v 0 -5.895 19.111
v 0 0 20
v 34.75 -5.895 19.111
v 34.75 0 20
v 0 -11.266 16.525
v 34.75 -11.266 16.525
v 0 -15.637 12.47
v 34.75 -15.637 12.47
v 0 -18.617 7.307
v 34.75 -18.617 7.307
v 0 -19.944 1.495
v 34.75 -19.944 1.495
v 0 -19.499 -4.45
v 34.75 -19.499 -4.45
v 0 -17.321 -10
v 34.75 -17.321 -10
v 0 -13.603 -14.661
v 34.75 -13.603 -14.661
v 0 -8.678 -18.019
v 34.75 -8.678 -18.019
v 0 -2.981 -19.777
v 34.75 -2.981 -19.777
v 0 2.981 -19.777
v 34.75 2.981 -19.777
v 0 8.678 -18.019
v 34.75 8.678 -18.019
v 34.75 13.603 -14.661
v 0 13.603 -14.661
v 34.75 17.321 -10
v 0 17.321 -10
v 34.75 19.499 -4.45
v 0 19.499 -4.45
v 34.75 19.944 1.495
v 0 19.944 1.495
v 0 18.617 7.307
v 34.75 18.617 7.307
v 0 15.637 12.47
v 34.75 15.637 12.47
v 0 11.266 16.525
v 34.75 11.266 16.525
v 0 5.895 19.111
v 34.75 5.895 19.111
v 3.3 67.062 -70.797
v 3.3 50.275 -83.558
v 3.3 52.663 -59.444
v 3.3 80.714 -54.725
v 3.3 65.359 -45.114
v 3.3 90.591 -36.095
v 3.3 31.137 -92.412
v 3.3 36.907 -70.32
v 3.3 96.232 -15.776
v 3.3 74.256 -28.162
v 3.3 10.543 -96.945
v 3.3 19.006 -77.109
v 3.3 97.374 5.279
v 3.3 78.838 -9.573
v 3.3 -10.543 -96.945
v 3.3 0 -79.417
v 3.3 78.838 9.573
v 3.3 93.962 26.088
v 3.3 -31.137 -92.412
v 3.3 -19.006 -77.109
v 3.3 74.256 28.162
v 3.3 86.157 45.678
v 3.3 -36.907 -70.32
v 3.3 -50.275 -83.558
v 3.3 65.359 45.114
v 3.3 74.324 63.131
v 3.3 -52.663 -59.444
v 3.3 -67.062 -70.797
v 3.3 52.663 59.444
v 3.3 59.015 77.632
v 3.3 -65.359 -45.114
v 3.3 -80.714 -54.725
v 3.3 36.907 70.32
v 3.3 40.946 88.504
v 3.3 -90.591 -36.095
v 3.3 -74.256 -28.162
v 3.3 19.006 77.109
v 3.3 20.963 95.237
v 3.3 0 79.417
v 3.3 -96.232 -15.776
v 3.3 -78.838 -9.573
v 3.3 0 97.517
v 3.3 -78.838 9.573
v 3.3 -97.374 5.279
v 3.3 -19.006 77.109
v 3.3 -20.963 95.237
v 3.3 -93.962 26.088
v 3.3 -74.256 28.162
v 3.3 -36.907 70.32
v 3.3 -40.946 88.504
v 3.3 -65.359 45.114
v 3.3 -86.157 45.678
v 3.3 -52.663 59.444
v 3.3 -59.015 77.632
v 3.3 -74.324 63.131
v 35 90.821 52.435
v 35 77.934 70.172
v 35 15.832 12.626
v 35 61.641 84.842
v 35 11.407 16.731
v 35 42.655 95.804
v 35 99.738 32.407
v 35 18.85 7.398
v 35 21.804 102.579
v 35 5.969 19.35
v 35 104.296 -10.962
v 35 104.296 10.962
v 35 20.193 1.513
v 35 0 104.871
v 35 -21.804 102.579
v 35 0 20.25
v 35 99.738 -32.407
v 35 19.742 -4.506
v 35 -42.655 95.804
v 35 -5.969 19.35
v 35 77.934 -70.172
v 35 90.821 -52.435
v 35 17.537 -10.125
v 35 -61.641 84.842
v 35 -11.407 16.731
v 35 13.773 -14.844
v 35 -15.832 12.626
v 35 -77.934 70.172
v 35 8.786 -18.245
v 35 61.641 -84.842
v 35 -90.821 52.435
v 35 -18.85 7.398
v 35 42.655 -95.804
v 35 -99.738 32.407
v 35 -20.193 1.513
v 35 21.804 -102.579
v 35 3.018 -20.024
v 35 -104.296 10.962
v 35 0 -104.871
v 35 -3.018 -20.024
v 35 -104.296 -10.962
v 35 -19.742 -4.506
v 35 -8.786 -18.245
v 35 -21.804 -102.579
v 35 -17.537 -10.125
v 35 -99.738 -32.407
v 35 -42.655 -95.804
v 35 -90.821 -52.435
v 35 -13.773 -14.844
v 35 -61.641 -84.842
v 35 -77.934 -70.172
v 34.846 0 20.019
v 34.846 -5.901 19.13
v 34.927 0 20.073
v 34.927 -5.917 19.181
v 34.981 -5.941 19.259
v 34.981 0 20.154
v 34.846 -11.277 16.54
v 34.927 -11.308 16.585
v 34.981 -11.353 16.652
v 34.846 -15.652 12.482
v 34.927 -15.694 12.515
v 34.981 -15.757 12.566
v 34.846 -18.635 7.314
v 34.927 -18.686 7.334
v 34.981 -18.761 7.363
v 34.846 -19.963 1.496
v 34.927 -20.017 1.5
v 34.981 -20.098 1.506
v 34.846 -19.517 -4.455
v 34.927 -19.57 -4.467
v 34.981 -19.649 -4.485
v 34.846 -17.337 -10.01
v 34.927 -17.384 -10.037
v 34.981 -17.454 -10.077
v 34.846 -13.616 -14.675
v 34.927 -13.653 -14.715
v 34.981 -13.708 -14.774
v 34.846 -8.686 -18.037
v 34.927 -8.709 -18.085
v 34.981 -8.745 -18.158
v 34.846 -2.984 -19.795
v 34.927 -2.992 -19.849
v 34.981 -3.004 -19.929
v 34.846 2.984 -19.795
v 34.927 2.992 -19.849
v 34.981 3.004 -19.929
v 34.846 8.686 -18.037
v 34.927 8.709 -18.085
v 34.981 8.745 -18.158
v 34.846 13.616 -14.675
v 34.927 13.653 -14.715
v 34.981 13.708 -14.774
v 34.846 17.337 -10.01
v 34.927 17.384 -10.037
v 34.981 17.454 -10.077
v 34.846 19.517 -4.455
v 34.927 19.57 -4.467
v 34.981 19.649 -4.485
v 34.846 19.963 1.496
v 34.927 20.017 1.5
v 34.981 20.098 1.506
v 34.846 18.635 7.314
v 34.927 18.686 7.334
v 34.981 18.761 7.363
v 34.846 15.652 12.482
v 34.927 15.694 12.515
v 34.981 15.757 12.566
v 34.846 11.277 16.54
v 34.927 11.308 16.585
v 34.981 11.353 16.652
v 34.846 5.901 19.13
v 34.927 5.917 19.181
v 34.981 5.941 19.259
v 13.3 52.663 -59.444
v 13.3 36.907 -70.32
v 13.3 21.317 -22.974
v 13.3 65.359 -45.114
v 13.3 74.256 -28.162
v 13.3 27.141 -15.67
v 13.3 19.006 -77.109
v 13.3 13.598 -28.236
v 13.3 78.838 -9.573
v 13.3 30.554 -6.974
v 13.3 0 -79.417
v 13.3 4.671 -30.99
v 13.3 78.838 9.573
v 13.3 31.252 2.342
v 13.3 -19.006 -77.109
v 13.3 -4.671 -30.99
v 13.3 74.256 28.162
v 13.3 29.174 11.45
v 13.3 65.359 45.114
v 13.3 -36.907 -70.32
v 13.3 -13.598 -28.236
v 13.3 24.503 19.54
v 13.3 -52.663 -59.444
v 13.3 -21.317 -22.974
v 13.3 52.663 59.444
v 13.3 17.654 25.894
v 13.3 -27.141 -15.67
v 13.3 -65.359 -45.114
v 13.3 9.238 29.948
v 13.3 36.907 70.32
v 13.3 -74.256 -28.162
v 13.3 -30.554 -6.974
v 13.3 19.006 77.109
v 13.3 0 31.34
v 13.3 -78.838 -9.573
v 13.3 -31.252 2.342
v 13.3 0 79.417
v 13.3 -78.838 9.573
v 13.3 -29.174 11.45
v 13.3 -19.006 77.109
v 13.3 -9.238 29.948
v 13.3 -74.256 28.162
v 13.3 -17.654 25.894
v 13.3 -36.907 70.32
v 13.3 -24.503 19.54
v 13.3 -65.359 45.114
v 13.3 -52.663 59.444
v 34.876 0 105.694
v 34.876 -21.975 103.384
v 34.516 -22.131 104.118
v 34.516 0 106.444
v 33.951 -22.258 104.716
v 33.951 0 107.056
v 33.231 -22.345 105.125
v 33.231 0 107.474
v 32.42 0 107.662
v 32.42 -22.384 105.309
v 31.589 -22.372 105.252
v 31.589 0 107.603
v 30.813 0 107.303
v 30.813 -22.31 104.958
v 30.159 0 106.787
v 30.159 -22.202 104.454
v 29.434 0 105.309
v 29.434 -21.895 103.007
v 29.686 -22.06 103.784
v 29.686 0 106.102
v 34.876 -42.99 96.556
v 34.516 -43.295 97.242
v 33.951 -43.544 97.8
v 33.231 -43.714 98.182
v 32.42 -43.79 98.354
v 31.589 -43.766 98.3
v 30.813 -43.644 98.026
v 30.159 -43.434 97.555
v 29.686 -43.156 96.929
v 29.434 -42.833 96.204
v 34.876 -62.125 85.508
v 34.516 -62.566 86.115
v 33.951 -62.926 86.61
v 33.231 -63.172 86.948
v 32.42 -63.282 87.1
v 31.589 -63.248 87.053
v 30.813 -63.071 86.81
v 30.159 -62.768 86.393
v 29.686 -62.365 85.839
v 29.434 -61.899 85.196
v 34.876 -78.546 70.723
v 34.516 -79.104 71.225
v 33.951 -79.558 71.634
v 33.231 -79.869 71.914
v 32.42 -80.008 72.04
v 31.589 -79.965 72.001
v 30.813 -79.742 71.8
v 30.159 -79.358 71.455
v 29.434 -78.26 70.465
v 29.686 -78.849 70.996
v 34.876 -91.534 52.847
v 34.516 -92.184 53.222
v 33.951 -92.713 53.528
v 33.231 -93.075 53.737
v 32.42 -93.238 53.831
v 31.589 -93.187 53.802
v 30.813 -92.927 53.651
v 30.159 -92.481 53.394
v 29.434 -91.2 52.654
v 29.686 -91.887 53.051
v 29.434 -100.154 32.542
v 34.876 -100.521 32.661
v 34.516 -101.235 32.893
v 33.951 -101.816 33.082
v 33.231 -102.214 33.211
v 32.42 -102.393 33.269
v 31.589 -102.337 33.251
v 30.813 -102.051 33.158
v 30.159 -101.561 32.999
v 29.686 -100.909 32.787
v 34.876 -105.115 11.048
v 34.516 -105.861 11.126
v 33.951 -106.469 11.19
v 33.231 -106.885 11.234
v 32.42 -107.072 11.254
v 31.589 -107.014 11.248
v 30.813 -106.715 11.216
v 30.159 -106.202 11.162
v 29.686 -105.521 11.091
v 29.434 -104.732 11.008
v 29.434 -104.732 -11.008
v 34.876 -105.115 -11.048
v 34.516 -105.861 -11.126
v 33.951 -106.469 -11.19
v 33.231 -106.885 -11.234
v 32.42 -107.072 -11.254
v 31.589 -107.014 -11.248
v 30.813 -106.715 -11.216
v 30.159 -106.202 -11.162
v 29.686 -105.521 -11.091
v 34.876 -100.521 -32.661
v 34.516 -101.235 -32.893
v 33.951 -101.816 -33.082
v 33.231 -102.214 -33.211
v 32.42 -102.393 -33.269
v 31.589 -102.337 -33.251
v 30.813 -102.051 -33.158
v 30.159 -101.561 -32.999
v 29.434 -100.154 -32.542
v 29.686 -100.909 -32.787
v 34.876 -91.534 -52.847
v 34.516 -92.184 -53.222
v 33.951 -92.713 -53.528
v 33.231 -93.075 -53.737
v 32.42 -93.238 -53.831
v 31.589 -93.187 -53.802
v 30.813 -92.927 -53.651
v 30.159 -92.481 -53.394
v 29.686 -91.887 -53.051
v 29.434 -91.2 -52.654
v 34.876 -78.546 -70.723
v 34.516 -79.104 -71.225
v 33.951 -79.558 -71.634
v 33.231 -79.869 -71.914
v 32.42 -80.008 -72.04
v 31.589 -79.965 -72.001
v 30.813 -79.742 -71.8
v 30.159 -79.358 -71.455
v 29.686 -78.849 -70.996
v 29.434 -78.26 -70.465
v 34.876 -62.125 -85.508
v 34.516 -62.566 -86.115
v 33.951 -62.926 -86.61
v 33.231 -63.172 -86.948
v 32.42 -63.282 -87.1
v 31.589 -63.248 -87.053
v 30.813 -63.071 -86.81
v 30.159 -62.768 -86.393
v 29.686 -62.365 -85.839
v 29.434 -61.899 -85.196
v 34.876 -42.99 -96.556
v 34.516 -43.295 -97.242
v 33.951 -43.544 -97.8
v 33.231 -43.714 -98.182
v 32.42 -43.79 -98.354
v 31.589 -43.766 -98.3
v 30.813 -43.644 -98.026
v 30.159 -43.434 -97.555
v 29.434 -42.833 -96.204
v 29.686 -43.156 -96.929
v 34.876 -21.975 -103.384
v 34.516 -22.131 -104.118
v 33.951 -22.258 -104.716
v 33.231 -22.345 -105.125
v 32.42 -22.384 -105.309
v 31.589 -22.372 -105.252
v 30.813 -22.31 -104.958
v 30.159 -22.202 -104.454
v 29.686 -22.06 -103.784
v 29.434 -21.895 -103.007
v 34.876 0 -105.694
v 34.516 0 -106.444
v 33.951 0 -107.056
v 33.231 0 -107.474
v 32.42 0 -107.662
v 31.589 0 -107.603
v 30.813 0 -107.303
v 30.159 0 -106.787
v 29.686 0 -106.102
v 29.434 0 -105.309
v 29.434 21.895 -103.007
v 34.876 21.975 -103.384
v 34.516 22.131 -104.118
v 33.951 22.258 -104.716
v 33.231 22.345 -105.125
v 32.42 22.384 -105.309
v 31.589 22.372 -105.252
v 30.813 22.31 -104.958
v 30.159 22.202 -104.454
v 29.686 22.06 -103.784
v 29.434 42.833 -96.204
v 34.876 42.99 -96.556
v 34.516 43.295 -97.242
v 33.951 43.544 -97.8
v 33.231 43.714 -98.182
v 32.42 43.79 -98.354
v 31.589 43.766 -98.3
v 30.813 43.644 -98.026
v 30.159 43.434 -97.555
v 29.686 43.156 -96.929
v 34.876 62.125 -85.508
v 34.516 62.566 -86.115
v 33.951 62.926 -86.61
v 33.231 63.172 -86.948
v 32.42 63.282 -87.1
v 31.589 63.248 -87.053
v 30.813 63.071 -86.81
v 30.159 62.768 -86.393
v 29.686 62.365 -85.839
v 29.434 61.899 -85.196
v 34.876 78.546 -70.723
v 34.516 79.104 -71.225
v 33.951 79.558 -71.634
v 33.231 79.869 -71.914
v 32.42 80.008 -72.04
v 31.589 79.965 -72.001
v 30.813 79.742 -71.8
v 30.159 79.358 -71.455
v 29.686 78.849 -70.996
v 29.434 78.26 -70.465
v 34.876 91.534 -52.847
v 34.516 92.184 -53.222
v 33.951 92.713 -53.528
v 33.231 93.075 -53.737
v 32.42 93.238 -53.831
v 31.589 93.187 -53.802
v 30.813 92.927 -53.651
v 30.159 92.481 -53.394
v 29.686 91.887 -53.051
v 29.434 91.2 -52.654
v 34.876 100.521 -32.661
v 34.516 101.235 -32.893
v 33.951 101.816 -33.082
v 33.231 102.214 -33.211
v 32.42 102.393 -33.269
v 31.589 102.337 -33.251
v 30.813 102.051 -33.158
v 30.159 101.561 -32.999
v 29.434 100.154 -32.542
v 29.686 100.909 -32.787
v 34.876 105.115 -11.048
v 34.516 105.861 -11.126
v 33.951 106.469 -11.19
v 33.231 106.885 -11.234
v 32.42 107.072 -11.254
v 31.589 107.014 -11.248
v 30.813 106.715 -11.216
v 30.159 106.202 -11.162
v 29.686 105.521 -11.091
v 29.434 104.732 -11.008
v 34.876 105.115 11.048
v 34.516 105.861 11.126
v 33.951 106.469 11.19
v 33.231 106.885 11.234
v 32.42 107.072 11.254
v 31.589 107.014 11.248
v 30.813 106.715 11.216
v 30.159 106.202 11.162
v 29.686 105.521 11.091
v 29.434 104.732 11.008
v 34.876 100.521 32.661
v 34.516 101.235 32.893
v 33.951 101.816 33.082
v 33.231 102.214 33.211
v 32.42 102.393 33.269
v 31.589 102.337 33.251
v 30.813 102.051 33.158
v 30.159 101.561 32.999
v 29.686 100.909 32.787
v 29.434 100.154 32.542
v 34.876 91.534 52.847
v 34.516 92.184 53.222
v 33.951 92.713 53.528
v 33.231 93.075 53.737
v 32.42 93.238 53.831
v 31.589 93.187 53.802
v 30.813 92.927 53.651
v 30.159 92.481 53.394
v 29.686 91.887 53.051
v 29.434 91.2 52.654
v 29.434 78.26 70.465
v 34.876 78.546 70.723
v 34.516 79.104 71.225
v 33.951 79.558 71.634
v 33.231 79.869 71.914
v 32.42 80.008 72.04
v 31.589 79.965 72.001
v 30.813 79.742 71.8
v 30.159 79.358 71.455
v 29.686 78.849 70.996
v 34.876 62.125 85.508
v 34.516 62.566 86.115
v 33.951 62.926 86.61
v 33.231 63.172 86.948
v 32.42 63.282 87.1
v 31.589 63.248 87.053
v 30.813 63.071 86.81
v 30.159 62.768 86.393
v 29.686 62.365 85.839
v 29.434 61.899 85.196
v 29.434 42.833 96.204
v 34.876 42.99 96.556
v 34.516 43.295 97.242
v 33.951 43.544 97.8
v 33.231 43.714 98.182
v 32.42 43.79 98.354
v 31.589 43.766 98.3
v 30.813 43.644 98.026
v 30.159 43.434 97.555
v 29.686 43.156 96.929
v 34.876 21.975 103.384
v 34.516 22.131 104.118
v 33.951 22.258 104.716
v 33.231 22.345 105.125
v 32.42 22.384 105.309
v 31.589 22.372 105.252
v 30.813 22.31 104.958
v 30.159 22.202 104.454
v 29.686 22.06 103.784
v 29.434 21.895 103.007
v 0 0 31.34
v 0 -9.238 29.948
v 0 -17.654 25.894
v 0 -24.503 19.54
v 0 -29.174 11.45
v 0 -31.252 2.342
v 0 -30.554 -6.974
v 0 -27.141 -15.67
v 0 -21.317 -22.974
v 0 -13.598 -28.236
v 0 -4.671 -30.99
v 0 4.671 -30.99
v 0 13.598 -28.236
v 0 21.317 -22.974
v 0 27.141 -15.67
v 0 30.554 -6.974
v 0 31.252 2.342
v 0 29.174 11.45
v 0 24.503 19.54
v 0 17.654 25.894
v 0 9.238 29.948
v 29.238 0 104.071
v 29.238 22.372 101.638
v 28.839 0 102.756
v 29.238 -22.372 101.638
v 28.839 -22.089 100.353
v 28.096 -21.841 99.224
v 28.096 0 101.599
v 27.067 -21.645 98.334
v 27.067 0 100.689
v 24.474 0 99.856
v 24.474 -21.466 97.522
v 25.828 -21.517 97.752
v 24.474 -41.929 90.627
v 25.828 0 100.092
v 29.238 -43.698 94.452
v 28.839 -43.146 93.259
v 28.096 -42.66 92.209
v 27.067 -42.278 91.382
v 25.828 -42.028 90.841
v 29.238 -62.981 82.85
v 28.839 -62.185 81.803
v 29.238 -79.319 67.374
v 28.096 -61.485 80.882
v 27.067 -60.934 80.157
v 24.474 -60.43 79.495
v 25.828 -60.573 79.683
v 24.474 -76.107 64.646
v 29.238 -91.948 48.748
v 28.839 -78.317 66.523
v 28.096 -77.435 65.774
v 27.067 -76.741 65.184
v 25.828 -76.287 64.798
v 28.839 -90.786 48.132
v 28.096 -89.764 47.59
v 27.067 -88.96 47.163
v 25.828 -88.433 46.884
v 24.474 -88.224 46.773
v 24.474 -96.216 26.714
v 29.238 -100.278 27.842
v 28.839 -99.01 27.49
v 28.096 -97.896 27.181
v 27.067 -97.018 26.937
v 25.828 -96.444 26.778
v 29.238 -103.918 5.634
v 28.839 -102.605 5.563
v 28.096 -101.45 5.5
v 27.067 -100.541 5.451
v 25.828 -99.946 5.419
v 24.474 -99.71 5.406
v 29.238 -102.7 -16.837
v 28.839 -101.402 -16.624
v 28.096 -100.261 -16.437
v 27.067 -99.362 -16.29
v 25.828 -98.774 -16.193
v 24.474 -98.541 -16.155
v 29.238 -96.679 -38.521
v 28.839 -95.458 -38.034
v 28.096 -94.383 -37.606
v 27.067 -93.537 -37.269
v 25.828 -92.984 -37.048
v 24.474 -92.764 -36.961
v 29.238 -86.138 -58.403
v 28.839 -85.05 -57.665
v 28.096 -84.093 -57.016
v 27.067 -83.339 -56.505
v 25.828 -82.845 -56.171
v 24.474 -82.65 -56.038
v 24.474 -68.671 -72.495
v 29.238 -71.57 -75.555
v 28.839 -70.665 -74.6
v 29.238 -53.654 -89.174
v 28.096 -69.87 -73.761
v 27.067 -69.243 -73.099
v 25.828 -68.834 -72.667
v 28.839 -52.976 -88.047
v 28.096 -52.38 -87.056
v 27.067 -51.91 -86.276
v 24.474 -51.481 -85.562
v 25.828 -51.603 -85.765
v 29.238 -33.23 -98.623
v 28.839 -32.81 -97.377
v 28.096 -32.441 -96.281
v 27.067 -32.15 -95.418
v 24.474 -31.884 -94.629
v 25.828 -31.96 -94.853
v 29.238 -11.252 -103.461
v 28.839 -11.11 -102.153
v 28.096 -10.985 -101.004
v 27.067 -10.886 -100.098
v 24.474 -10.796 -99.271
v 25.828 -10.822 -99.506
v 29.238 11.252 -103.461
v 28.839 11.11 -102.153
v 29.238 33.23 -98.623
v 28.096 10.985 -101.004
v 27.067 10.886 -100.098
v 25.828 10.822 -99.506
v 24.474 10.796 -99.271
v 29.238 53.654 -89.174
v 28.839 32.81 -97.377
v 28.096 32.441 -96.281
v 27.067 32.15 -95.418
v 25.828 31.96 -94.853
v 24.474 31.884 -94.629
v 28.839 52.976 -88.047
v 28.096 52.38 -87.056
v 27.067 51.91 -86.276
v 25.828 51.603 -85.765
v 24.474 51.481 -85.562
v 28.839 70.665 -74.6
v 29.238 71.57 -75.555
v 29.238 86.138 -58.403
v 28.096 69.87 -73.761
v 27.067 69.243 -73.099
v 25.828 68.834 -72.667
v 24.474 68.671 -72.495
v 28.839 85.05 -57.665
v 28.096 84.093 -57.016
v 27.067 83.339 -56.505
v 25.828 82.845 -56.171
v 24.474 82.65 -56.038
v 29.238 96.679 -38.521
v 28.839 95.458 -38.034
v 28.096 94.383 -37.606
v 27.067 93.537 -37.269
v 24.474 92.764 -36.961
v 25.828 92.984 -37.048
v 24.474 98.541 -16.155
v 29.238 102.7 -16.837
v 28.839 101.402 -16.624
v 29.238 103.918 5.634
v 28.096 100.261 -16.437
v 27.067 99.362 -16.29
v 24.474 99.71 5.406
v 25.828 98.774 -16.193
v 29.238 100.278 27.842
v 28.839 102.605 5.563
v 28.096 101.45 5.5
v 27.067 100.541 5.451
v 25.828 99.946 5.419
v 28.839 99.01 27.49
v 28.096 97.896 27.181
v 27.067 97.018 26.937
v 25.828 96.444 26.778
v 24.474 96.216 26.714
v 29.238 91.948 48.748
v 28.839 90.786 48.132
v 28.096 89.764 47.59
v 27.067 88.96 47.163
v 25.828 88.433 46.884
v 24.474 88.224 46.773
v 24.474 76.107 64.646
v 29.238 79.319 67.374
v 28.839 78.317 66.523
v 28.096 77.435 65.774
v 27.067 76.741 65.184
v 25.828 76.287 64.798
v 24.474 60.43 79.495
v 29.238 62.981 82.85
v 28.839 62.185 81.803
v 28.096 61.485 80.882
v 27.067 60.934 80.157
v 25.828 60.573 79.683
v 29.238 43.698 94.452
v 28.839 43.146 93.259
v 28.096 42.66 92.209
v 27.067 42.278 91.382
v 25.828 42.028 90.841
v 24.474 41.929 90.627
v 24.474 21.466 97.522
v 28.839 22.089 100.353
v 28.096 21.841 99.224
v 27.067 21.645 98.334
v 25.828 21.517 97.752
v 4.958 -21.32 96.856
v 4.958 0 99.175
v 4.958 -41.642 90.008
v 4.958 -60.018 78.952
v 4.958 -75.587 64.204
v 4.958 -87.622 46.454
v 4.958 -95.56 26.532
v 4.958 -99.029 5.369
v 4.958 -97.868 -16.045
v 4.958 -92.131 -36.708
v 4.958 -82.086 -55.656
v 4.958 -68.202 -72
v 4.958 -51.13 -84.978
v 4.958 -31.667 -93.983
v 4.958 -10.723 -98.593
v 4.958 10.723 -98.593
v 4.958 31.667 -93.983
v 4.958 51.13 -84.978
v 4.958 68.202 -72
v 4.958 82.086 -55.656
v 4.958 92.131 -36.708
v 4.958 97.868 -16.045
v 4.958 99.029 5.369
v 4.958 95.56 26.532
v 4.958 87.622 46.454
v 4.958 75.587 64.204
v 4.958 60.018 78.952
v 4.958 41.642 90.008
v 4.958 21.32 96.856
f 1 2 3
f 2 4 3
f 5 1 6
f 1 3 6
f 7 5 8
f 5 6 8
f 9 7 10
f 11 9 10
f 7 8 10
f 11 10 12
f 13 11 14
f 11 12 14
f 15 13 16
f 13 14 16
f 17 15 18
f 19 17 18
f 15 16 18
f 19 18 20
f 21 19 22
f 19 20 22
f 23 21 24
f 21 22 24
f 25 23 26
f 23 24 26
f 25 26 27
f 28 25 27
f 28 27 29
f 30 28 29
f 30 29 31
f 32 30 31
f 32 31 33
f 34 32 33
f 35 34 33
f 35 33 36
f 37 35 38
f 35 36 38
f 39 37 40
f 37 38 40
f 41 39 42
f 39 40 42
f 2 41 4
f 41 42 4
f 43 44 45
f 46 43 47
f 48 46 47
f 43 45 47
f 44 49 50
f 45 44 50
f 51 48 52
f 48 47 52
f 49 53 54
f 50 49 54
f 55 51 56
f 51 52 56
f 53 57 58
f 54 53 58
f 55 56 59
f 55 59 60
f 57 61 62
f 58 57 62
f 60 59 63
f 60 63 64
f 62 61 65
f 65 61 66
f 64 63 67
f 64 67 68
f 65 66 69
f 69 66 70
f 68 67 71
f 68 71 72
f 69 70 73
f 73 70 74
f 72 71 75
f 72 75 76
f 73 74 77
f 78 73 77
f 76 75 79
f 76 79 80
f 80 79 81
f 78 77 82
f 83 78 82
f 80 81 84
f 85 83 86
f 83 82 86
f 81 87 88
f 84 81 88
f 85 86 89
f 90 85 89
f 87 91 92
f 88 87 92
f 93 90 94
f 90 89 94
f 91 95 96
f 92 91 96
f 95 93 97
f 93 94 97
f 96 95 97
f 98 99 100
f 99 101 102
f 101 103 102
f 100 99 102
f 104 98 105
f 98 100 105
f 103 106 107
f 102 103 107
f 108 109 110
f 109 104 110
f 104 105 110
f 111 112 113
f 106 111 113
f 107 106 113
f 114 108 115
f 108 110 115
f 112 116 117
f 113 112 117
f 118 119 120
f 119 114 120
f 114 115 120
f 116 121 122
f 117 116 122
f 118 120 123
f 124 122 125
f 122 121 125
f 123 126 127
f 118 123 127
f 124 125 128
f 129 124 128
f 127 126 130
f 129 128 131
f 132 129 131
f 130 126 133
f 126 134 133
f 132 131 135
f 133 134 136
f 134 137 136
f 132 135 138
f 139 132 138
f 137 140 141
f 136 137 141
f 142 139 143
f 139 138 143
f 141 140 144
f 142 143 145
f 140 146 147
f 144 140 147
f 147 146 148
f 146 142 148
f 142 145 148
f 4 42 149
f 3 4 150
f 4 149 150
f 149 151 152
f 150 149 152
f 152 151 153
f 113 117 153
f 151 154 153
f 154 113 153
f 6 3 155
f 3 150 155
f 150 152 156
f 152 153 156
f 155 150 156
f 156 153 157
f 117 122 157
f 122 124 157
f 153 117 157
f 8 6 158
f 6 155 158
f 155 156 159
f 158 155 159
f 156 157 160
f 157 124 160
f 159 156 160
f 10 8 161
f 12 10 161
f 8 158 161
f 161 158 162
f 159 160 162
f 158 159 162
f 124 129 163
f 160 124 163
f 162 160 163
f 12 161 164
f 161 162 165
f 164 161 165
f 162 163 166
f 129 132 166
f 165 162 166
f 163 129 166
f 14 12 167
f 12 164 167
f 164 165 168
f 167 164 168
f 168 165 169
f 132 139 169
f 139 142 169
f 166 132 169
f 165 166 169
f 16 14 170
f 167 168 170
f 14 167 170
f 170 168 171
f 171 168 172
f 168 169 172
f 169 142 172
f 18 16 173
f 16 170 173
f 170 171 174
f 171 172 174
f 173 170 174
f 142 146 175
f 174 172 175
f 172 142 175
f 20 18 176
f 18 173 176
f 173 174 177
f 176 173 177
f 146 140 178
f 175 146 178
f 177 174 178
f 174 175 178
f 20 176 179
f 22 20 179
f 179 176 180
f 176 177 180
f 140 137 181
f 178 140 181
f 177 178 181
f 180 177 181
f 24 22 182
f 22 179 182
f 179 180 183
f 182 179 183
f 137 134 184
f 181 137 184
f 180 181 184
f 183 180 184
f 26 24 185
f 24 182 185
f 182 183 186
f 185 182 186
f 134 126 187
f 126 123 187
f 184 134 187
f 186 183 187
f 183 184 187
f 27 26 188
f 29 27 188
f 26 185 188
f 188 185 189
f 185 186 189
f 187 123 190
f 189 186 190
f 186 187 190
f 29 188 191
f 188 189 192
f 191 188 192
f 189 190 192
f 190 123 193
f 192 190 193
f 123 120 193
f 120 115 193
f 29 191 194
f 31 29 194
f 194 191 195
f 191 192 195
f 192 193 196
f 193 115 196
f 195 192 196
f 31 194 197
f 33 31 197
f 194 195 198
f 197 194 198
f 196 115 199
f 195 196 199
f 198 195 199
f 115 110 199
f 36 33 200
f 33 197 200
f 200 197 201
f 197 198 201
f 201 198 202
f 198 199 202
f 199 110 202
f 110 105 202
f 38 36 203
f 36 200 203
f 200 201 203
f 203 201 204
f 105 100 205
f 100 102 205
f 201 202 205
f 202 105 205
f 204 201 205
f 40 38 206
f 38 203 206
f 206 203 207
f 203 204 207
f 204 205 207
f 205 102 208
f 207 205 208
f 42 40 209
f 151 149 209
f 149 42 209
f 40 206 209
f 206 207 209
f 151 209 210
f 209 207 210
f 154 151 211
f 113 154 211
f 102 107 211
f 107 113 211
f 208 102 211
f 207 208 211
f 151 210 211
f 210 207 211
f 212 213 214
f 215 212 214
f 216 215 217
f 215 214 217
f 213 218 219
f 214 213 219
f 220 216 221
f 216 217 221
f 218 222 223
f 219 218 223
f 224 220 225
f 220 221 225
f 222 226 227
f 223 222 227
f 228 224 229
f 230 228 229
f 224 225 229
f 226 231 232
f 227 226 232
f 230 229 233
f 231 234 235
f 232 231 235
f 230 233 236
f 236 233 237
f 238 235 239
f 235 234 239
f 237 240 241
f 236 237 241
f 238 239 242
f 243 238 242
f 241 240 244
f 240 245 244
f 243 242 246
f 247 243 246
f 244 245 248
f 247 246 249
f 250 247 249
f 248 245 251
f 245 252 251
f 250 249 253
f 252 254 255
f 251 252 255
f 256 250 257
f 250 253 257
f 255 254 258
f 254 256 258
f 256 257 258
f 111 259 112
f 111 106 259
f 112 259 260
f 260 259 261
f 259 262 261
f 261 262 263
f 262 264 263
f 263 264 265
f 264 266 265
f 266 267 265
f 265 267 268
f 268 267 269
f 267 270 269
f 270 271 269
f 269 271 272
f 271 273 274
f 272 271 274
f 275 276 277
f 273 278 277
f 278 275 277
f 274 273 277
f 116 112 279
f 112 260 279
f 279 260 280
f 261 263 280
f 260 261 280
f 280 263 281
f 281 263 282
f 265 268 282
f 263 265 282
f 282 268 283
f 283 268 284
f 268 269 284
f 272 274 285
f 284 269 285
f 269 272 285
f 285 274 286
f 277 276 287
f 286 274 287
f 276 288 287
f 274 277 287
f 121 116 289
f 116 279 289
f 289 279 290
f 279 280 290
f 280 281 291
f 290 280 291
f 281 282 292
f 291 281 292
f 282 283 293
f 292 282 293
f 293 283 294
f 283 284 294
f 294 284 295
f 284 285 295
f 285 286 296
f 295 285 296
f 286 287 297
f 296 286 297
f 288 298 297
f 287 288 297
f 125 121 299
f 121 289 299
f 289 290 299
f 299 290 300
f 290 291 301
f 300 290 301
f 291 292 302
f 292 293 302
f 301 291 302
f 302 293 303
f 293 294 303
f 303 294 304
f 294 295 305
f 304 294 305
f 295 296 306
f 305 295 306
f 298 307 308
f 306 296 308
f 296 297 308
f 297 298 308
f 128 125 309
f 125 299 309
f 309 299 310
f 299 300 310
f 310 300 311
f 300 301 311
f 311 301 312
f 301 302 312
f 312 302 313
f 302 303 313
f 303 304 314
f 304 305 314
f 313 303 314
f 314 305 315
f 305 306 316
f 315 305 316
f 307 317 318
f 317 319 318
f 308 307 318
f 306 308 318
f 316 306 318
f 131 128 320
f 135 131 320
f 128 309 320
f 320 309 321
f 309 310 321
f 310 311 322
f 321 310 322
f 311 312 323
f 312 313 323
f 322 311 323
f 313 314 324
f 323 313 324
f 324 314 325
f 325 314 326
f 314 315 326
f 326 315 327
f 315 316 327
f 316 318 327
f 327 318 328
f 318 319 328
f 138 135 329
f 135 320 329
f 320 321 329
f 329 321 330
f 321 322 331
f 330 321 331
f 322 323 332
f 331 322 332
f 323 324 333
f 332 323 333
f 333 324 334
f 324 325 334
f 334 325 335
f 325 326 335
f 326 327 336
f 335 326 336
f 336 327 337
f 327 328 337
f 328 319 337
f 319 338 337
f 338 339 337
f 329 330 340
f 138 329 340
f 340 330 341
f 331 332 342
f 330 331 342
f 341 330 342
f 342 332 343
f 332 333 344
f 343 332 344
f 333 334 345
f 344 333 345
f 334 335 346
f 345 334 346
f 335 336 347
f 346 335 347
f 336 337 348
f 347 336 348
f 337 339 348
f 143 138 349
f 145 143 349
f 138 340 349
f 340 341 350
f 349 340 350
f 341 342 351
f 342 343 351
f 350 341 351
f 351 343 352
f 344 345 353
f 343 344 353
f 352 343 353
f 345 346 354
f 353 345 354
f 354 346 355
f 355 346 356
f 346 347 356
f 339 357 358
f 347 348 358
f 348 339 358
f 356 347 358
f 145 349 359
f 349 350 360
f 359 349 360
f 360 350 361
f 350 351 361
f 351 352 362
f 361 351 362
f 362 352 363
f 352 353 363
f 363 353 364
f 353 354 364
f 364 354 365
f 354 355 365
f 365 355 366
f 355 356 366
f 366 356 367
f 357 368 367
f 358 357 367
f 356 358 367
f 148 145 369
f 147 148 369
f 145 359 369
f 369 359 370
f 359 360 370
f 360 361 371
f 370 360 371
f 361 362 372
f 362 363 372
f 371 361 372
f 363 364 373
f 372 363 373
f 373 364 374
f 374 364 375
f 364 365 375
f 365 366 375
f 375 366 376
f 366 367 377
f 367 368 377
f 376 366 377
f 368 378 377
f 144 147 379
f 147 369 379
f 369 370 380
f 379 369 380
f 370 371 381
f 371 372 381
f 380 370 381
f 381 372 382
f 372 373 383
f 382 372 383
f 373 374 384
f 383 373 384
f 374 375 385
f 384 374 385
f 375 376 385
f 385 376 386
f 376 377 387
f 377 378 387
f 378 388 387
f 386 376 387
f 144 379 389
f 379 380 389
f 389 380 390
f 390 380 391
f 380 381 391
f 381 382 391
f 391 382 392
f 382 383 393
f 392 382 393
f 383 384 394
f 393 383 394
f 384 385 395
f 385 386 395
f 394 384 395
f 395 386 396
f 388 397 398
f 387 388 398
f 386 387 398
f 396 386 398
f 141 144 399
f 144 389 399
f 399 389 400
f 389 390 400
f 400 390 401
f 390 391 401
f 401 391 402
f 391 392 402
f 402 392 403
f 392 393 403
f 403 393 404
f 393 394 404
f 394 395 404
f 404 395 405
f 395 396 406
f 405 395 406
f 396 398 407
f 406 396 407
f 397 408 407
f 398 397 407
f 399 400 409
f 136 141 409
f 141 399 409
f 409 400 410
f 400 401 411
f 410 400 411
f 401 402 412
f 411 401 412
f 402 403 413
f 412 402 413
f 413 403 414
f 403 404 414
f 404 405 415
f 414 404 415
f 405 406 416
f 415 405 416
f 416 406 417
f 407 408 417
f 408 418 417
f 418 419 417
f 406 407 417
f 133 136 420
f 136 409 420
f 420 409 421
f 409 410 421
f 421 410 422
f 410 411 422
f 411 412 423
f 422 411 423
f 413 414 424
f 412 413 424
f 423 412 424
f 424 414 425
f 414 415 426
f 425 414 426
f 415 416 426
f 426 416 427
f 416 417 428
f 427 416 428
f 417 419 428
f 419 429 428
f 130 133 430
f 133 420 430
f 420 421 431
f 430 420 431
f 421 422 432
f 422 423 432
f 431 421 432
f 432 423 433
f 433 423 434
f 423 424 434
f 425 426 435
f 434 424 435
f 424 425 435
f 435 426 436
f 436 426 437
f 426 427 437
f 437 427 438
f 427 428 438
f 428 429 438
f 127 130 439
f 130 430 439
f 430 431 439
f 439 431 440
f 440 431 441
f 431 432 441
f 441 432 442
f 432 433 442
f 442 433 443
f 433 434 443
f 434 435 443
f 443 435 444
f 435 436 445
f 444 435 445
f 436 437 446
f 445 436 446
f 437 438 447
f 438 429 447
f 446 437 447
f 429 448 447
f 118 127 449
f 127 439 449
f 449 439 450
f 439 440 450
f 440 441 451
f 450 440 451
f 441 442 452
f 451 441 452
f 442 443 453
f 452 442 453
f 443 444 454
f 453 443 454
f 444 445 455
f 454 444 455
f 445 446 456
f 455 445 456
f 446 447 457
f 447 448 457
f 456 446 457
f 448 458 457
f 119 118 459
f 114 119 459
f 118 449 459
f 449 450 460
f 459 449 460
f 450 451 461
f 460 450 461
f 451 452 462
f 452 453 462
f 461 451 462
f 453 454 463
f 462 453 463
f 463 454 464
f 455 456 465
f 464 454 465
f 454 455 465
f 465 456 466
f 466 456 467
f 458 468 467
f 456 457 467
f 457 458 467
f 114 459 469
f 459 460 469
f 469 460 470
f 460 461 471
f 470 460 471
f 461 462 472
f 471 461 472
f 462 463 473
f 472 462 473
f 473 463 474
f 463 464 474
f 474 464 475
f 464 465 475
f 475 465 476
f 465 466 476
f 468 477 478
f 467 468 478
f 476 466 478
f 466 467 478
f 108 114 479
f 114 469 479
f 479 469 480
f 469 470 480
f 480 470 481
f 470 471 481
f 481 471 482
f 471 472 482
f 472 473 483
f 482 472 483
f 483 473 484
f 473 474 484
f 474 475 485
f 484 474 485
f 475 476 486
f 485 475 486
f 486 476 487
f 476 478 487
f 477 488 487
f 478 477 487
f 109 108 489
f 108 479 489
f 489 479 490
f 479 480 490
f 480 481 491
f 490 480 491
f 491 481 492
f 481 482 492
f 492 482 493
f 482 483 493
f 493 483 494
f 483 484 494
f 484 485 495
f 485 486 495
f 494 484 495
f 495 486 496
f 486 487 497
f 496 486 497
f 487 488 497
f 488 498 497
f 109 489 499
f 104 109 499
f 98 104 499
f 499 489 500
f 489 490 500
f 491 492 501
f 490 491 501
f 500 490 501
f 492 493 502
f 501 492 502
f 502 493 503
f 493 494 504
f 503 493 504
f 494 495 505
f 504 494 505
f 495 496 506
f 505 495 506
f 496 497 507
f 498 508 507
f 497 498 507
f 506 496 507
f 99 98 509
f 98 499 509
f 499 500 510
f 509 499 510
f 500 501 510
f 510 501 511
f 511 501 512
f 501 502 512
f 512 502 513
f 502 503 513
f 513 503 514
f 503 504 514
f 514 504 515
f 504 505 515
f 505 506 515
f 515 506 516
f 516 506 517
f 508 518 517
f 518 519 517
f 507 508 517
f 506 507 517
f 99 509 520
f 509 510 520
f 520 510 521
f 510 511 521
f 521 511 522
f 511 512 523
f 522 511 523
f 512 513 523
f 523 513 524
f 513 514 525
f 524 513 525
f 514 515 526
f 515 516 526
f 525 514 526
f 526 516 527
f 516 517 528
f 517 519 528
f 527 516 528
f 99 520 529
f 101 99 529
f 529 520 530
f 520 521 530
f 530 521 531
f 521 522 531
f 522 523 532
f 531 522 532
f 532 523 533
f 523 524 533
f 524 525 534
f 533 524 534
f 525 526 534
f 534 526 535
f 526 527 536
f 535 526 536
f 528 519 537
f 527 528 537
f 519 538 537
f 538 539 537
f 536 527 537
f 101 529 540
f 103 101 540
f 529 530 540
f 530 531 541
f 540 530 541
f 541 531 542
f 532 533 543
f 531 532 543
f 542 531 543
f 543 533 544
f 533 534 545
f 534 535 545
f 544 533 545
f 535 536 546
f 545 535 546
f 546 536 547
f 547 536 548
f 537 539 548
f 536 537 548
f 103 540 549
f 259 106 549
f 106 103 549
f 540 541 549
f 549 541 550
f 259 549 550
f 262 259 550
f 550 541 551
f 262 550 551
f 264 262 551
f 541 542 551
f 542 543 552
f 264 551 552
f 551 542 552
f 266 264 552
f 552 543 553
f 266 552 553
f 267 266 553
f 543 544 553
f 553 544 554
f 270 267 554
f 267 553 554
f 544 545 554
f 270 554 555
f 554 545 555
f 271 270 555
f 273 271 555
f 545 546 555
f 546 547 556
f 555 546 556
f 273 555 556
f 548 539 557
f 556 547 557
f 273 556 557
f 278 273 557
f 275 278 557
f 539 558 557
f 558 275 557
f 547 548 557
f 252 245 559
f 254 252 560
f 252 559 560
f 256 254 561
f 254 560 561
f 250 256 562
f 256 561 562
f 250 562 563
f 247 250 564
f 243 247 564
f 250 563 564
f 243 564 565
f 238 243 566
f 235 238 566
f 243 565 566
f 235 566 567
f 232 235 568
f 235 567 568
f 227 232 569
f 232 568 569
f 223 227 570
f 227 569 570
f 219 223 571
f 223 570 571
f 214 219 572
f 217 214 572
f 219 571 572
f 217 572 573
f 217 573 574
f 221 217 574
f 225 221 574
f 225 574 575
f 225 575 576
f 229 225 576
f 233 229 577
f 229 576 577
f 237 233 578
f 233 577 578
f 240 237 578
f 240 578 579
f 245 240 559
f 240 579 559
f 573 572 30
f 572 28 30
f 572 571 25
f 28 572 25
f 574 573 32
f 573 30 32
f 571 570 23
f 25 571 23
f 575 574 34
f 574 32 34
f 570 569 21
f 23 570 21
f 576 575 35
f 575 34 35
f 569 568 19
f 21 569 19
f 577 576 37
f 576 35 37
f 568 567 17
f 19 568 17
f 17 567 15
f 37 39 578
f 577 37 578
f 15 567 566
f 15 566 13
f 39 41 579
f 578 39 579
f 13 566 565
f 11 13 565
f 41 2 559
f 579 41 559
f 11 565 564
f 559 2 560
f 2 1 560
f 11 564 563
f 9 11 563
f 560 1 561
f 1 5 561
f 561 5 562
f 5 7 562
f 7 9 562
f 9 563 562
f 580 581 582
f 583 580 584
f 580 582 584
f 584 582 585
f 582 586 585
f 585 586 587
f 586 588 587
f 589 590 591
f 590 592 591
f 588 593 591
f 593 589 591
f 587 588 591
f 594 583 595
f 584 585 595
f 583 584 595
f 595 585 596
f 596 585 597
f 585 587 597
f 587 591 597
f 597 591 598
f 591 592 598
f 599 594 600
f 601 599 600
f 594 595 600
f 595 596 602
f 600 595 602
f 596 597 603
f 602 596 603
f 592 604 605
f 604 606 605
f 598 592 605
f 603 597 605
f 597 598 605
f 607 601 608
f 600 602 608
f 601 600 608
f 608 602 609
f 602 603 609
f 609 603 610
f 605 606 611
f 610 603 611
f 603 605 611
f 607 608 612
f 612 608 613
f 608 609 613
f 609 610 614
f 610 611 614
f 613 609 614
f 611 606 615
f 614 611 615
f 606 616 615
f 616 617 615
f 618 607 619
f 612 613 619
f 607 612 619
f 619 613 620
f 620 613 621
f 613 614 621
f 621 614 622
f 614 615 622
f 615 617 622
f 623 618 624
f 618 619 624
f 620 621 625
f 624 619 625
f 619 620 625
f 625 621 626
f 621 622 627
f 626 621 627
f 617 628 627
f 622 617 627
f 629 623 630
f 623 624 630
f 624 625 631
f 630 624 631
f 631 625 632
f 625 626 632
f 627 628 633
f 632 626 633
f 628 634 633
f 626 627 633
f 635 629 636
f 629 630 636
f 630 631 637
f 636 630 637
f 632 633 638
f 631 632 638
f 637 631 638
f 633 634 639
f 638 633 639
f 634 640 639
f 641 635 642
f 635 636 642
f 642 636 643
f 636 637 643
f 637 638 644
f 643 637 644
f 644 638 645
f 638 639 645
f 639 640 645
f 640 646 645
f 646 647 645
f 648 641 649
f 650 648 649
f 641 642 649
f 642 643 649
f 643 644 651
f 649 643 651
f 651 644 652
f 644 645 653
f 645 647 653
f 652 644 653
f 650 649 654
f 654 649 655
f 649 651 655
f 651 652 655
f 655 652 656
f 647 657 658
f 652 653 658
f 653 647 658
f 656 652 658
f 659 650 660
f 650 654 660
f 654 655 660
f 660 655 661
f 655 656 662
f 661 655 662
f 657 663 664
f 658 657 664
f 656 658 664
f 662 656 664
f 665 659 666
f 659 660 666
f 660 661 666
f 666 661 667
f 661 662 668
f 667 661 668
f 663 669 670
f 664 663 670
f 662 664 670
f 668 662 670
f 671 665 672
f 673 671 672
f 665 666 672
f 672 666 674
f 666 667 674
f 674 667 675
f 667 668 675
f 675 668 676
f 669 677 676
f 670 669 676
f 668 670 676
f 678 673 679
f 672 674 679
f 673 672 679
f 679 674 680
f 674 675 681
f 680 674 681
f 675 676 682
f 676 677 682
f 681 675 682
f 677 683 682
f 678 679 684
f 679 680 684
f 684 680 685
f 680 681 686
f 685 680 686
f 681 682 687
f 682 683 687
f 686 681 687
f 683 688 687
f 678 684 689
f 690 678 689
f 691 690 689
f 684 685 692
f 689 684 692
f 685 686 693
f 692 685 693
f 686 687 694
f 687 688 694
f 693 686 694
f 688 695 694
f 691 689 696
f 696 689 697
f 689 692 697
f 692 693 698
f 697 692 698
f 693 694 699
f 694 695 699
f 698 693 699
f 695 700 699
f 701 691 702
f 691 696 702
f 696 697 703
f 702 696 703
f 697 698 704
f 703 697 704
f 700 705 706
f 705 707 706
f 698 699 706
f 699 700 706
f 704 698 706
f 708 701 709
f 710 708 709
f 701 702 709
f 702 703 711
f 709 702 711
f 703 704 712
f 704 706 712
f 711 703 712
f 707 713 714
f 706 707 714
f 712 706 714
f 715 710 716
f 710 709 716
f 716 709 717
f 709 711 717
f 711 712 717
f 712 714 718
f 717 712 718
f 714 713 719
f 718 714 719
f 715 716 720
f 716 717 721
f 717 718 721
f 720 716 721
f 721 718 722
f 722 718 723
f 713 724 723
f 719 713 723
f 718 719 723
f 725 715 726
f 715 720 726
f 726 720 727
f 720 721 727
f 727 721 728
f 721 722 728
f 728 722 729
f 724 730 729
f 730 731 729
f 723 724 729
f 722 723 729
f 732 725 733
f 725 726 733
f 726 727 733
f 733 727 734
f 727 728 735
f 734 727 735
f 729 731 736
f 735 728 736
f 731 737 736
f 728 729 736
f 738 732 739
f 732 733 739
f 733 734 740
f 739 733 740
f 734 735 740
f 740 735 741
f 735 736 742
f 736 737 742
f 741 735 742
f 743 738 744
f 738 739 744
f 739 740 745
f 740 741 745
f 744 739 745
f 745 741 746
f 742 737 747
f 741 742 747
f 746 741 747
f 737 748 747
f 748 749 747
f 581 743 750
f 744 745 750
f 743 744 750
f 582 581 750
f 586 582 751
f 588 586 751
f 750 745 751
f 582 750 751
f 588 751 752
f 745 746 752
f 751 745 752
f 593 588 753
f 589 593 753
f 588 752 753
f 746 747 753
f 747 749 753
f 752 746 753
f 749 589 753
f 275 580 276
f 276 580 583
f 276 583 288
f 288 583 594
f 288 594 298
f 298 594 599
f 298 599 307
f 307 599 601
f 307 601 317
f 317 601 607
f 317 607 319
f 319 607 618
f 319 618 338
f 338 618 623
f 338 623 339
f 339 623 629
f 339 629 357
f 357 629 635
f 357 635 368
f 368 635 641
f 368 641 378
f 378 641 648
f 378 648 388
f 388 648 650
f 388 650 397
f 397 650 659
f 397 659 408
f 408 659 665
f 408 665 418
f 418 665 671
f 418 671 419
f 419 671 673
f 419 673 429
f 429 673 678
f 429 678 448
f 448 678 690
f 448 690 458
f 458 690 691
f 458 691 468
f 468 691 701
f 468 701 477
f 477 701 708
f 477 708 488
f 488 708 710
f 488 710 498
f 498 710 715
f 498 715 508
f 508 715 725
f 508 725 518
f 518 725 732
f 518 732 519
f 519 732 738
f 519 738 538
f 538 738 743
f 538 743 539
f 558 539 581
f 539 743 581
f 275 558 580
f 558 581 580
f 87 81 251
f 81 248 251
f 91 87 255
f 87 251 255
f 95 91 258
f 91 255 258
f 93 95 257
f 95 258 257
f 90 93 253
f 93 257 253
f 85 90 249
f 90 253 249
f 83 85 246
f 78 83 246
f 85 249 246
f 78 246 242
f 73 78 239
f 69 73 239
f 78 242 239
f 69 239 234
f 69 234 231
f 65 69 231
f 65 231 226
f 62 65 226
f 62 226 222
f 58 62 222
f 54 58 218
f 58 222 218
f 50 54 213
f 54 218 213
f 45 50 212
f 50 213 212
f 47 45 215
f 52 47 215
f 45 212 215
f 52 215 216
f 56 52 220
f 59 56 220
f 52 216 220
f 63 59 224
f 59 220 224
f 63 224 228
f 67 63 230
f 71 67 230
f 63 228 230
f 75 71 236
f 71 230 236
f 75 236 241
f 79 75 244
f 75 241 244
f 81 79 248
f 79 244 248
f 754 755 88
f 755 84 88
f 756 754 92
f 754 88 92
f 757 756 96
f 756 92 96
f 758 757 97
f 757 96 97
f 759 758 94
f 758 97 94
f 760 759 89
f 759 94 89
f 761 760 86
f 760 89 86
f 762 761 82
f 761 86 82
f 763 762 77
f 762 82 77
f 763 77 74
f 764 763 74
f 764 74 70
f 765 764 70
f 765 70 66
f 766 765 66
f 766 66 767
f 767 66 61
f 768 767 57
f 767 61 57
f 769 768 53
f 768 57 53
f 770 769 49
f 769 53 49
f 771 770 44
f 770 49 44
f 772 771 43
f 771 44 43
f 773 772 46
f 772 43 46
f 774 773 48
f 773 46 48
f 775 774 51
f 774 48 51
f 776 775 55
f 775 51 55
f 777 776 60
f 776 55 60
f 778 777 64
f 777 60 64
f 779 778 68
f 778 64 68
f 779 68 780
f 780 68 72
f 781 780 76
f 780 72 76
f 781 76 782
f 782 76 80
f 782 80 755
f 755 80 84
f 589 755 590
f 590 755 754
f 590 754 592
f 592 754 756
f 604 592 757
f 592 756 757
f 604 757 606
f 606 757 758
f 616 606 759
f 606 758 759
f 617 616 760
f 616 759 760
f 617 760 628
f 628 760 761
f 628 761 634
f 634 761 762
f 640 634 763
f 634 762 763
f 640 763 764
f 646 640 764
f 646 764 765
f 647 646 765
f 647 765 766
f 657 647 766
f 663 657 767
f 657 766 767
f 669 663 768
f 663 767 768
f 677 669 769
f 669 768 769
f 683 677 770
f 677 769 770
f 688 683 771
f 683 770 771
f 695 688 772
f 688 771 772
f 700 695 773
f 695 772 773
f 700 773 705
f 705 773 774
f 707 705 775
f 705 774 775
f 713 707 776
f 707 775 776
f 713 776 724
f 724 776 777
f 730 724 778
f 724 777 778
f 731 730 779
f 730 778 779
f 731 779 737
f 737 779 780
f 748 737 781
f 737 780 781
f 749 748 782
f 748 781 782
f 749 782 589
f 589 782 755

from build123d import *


with BuildPart() as part:
    # Sketch1 → Revolve1 (revolve)
    with BuildSketch(Plane.XY, mode=Mode.PRIVATE) as revolve1_sk:
        with BuildLine():
            Line((0, 20), (34.75, 20))
            ThreePointArc((34.75, 20), (34.926776695, 20.073223305), (35, 20.25))
            Line((35, 20.25), (35, 104.870611348))
            ThreePointArc((35, 104.870611348), (32.419685468, 107.661979883), (29.434472646, 105.308627851))
            Line((29.434472646, 105.308627851), (29.238441703, 104.070937185))
            ThreePointArc((29.238441703, 104.070937185), (27.613100241, 101.108330906), (24.474497484, 99.856155375))
            Line((24.474497484, 99.856155375), (4.957894968, 99.174620597))
            Line((4.957894968, 99.174620597), (3.3, 97.516725629))
            Line((3.3, 97.516725629), (3.3, 79.416725629))
            Line((3.3, 79.416725629), (13.3, 79.416725629))
            Line((13.3, 79.416725629), (13.3, 31.34))
            Line((13.3, 31.34), (0, 31.34))
            Line((0, 31.34), (0, 20))
        make_face()
    revolve(revolve1_sk.sketch.rotate(Axis((-146.164683843, 0, 0), (1, 0, 0)), 90), axis=Axis((-146.164683843, 0, 0), (1, 0, 0)))


solid = part.part
